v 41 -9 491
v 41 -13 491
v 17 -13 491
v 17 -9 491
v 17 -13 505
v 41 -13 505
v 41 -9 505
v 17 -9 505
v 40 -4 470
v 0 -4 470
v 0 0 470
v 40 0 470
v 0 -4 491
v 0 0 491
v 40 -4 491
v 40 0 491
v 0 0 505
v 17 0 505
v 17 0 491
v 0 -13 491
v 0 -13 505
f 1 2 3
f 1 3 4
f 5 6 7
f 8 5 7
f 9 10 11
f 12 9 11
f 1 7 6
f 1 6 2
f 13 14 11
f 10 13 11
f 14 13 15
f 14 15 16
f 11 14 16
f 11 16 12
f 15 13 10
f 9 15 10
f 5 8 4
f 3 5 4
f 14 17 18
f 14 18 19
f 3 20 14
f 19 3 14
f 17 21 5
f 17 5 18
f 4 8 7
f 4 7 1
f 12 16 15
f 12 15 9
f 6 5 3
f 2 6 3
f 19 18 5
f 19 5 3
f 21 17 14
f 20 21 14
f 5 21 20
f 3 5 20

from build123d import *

# Parameters (mm, degrees)
ANCHOR_PLATE_START = 17
SKETCH1_W          = 14
SKETCH1_H          = 4
ANCHOR_PLATE_DEPTH = 24
SKETCH2_W          = 14
SKETCH2_H          = 13
COLUMN_DEPTH       = 17
SKETCH3_W          = 21
SKETCH3_H          = 4
FOOT_DEPTH         = 40


with BuildPart() as part:
    # Sketch1 → anchor_plate (new body)
    with BuildSketch(Plane(origin=(0, 0, 0), x_dir=(0, 0, -1), z_dir=(1, 0, 0)).offset(ANCHOR_PLATE_START)):
        with Locations((-498, -11)):
            Rectangle(SKETCH1_W, SKETCH1_H)
    extrude(amount=ANCHOR_PLATE_DEPTH)


with BuildPart() as body_2:
    # Sketch2 → column (new body)
    with BuildSketch(Plane(origin=(0, 0, 0), x_dir=(0, 0, -1), z_dir=(1, 0, 0))):
        with Locations((-498, -6.5)):
            Rectangle(SKETCH2_W, SKETCH2_H)
    extrude(amount=COLUMN_DEPTH)


with BuildPart() as body_3:
    # Sketch3 → foot (new body)
    with BuildSketch(Plane(origin=(0, 0, 0), x_dir=(0, 0, -1), z_dir=(1, 0, 0))):
        with Locations((-480.5, -2)):
            Rectangle(SKETCH3_W, SKETCH3_H)
    extrude(amount=FOOT_DEPTH)


solid = Compound([part.part, body_2.part, body_3.part])
